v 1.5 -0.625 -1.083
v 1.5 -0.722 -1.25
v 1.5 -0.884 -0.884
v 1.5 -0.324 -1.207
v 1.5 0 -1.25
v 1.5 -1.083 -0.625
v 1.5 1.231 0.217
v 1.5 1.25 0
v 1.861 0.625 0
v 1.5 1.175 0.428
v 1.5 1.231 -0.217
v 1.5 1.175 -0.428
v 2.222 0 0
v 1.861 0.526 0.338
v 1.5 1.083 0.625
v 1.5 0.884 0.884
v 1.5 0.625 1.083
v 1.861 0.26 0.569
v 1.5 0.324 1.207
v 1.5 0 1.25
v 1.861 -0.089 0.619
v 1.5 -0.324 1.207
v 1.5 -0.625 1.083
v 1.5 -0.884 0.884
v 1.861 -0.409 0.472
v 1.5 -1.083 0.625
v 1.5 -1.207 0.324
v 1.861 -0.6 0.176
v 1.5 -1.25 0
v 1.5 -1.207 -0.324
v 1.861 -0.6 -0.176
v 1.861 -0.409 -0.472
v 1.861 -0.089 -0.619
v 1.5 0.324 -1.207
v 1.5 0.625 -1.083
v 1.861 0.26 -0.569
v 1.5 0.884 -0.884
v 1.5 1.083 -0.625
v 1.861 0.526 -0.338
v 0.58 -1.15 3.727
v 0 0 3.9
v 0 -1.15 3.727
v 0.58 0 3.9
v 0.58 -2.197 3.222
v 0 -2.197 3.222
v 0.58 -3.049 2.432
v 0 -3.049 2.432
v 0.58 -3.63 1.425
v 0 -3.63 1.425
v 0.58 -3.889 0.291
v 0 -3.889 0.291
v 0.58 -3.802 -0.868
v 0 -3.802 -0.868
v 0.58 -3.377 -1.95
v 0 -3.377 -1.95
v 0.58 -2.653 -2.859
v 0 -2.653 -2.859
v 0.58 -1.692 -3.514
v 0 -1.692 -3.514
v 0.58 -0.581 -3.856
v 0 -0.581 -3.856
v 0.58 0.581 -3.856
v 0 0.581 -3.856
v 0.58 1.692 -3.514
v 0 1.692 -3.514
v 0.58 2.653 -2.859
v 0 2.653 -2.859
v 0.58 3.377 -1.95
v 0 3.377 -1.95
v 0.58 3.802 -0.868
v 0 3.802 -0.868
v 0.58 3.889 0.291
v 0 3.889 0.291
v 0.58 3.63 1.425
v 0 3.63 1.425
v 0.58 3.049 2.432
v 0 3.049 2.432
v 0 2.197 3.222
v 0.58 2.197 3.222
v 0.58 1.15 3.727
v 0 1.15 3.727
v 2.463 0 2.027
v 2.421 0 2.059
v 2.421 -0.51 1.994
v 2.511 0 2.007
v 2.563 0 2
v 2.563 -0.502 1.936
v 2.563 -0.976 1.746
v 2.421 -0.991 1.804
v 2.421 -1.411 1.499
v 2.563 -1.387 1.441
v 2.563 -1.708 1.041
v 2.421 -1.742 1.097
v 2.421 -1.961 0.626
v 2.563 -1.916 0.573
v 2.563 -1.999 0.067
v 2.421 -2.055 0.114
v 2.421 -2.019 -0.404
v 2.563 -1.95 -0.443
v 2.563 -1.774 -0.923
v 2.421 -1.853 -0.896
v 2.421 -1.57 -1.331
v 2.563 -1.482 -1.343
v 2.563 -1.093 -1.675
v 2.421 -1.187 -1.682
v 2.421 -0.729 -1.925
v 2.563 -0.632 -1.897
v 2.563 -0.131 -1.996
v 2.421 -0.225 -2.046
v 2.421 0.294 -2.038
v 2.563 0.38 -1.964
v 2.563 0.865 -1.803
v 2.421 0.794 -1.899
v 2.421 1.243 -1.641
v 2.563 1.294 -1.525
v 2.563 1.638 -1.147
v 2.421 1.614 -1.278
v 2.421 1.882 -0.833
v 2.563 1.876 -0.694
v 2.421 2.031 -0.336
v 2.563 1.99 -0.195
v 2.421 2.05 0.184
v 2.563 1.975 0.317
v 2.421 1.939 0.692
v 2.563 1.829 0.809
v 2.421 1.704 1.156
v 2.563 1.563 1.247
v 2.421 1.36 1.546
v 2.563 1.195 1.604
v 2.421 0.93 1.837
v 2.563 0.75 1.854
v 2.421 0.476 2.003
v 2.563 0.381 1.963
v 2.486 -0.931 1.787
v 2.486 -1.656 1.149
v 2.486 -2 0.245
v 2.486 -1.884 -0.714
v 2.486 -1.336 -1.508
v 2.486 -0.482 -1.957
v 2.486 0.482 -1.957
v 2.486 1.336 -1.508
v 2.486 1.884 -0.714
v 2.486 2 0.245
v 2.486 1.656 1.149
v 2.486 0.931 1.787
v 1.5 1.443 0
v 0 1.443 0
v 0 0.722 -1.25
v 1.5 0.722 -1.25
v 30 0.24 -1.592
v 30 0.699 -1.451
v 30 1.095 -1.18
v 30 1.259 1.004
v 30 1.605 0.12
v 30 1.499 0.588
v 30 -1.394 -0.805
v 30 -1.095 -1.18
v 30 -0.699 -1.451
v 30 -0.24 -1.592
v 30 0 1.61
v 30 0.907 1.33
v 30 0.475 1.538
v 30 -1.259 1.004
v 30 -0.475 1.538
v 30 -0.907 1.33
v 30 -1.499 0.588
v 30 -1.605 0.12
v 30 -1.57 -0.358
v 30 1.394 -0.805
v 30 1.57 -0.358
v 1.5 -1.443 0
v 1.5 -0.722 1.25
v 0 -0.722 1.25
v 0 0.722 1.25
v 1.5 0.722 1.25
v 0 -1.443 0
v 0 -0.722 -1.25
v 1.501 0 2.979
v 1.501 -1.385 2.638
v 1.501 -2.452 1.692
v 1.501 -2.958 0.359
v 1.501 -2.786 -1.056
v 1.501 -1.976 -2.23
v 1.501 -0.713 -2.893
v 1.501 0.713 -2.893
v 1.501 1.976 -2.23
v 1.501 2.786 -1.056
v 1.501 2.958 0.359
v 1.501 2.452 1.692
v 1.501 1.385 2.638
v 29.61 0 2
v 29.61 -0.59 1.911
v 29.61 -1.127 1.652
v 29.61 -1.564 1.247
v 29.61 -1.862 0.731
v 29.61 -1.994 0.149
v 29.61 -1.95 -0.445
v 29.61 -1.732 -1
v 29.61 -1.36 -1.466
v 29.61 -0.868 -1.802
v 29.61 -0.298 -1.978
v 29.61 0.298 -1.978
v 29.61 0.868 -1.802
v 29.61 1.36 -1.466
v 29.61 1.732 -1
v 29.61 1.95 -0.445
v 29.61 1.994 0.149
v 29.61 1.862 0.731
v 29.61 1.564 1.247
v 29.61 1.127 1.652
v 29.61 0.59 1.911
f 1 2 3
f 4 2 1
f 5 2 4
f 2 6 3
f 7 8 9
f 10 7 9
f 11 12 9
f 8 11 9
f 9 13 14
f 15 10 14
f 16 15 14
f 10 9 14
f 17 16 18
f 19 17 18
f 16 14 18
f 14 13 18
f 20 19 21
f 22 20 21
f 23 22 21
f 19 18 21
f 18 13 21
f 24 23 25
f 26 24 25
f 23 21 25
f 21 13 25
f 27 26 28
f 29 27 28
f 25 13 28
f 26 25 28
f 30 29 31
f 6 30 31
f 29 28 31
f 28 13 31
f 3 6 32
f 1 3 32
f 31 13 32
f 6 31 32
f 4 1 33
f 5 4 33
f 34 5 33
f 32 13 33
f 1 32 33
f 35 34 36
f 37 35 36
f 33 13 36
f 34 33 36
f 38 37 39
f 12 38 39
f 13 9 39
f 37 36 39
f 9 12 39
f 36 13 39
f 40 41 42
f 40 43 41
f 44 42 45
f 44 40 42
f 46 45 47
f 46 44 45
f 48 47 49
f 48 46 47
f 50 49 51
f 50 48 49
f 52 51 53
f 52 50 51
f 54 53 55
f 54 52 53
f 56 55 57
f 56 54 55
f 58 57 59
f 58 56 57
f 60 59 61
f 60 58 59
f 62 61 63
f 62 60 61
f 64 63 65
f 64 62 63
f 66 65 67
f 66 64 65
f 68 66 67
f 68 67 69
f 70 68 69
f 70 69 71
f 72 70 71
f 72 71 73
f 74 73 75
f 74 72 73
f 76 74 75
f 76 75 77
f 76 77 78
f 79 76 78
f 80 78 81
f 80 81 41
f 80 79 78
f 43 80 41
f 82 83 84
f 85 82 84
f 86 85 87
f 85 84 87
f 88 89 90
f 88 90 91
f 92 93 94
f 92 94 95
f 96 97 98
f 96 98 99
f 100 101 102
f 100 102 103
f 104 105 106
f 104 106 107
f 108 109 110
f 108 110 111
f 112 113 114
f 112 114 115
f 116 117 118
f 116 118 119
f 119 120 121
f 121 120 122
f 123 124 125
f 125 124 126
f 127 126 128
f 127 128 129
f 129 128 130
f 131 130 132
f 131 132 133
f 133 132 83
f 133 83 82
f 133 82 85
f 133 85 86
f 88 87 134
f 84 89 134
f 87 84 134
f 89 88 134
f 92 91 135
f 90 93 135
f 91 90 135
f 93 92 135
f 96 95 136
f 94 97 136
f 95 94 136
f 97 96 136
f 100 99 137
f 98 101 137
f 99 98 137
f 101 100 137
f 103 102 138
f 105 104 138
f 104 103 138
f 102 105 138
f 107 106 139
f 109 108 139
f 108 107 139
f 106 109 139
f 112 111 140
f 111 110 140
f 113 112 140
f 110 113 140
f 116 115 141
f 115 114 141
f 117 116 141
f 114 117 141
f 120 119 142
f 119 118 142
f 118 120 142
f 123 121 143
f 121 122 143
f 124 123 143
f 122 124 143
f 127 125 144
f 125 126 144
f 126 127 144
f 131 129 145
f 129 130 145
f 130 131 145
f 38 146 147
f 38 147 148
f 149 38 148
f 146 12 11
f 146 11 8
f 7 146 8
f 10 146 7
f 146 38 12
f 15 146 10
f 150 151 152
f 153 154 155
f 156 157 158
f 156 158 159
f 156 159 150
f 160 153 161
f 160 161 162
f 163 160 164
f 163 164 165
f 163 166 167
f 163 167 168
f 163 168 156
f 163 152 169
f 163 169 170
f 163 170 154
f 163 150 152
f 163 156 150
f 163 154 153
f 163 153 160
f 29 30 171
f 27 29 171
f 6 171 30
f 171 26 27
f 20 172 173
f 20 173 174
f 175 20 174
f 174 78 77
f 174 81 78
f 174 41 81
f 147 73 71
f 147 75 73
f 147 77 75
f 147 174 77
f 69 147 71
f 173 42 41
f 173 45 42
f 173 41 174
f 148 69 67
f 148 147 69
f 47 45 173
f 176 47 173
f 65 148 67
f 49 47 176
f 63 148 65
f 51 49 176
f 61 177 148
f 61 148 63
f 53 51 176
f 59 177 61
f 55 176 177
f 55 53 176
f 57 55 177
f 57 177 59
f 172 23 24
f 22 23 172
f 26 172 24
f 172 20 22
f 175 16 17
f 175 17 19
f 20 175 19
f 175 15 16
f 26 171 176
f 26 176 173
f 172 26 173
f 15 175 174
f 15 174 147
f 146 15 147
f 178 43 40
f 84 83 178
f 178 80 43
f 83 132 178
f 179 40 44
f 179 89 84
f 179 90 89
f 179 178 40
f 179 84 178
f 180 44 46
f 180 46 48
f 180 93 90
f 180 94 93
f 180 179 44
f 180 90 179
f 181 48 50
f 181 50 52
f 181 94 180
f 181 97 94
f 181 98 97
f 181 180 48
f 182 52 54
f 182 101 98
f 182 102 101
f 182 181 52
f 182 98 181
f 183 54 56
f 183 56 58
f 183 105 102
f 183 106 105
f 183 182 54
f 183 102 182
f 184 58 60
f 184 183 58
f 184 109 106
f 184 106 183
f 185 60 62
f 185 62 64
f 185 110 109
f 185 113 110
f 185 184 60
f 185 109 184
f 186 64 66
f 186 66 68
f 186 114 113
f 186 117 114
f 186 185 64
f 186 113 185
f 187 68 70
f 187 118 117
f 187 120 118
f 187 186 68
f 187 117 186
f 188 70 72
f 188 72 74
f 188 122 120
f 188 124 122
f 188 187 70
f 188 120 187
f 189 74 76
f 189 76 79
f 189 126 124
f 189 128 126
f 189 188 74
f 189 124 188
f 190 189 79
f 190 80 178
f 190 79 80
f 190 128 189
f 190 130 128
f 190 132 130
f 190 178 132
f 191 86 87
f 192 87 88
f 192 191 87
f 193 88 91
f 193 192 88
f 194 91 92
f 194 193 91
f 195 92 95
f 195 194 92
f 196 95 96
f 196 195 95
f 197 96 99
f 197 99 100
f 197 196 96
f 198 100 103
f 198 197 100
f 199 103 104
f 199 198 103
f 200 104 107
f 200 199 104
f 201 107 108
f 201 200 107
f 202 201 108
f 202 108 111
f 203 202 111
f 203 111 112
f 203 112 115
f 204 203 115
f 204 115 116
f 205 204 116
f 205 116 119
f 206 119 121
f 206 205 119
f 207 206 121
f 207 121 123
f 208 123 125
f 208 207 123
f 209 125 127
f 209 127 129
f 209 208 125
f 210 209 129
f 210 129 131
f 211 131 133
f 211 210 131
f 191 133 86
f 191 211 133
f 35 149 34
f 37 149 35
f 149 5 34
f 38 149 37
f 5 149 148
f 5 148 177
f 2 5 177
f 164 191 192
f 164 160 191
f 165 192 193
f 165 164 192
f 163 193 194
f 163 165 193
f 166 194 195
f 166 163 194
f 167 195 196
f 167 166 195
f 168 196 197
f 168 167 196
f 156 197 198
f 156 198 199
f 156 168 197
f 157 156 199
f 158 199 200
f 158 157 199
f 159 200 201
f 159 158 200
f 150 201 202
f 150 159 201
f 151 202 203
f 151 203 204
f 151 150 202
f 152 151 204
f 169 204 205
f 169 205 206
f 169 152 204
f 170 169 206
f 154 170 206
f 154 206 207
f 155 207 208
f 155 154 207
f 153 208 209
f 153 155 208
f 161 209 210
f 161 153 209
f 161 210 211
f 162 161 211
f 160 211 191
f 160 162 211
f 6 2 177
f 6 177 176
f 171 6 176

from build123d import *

# Parameters (mm, degrees)
FILLET1_R   = 0.2
HEX_START   = -1.5
HEX_2_DEPTH = 1.5


with BuildPart() as part:
    # BodySke → BaseBody (revolve)
    with BuildSketch(Plane.XY, mode=Mode.PRIVATE) as basebody_sk:
        Polygon((0, 0), (0, 3.9), (0.58, 3.9), (2.48, 2), (29.61, 2), (30, 1.61), (30, 0), align=None)
    revolve(basebody_sk.sketch.rotate(Axis((0, 0, 0), (1, 0, 0)), 90), axis=Axis((0, 0, 0), (1, 0, 0)))

    # Fillet1
    fillet1_edges = [part.edges().sort_by_distance(p)[0] for p in [
        (2.48, 0, -2),
    ]]
    fillet(fillet1_edges, radius=FILLET1_R)

    # Hex 2: read off the stored shape, not the designer's step
    # Hex 2 outline → Hex 2 (cut)
    with BuildSketch(Plane.ZY.offset(HEX_START)):
        Polygon((-1.25, -0.721687836), (0, -1.443375673), (1.25, -0.721687836), (1.25, 0.721687836), (0, 1.443375673), (-1.25, 0.721687836), align=None)
    extrude(amount=HEX_2_DEPTH, mode=Mode.SUBTRACT)

    # Hex 2 2 outline → Hex 2 2 (revolve, cut)
    with BuildSketch(Plane.YX):
        Polygon((1.25, 1.5), (0, 2.221687836), (0, 1.5), align=None)
    revolve(axis=Axis((0, 0, 0), (1, 0, 0)), mode=Mode.SUBTRACT)


solid = part.part
